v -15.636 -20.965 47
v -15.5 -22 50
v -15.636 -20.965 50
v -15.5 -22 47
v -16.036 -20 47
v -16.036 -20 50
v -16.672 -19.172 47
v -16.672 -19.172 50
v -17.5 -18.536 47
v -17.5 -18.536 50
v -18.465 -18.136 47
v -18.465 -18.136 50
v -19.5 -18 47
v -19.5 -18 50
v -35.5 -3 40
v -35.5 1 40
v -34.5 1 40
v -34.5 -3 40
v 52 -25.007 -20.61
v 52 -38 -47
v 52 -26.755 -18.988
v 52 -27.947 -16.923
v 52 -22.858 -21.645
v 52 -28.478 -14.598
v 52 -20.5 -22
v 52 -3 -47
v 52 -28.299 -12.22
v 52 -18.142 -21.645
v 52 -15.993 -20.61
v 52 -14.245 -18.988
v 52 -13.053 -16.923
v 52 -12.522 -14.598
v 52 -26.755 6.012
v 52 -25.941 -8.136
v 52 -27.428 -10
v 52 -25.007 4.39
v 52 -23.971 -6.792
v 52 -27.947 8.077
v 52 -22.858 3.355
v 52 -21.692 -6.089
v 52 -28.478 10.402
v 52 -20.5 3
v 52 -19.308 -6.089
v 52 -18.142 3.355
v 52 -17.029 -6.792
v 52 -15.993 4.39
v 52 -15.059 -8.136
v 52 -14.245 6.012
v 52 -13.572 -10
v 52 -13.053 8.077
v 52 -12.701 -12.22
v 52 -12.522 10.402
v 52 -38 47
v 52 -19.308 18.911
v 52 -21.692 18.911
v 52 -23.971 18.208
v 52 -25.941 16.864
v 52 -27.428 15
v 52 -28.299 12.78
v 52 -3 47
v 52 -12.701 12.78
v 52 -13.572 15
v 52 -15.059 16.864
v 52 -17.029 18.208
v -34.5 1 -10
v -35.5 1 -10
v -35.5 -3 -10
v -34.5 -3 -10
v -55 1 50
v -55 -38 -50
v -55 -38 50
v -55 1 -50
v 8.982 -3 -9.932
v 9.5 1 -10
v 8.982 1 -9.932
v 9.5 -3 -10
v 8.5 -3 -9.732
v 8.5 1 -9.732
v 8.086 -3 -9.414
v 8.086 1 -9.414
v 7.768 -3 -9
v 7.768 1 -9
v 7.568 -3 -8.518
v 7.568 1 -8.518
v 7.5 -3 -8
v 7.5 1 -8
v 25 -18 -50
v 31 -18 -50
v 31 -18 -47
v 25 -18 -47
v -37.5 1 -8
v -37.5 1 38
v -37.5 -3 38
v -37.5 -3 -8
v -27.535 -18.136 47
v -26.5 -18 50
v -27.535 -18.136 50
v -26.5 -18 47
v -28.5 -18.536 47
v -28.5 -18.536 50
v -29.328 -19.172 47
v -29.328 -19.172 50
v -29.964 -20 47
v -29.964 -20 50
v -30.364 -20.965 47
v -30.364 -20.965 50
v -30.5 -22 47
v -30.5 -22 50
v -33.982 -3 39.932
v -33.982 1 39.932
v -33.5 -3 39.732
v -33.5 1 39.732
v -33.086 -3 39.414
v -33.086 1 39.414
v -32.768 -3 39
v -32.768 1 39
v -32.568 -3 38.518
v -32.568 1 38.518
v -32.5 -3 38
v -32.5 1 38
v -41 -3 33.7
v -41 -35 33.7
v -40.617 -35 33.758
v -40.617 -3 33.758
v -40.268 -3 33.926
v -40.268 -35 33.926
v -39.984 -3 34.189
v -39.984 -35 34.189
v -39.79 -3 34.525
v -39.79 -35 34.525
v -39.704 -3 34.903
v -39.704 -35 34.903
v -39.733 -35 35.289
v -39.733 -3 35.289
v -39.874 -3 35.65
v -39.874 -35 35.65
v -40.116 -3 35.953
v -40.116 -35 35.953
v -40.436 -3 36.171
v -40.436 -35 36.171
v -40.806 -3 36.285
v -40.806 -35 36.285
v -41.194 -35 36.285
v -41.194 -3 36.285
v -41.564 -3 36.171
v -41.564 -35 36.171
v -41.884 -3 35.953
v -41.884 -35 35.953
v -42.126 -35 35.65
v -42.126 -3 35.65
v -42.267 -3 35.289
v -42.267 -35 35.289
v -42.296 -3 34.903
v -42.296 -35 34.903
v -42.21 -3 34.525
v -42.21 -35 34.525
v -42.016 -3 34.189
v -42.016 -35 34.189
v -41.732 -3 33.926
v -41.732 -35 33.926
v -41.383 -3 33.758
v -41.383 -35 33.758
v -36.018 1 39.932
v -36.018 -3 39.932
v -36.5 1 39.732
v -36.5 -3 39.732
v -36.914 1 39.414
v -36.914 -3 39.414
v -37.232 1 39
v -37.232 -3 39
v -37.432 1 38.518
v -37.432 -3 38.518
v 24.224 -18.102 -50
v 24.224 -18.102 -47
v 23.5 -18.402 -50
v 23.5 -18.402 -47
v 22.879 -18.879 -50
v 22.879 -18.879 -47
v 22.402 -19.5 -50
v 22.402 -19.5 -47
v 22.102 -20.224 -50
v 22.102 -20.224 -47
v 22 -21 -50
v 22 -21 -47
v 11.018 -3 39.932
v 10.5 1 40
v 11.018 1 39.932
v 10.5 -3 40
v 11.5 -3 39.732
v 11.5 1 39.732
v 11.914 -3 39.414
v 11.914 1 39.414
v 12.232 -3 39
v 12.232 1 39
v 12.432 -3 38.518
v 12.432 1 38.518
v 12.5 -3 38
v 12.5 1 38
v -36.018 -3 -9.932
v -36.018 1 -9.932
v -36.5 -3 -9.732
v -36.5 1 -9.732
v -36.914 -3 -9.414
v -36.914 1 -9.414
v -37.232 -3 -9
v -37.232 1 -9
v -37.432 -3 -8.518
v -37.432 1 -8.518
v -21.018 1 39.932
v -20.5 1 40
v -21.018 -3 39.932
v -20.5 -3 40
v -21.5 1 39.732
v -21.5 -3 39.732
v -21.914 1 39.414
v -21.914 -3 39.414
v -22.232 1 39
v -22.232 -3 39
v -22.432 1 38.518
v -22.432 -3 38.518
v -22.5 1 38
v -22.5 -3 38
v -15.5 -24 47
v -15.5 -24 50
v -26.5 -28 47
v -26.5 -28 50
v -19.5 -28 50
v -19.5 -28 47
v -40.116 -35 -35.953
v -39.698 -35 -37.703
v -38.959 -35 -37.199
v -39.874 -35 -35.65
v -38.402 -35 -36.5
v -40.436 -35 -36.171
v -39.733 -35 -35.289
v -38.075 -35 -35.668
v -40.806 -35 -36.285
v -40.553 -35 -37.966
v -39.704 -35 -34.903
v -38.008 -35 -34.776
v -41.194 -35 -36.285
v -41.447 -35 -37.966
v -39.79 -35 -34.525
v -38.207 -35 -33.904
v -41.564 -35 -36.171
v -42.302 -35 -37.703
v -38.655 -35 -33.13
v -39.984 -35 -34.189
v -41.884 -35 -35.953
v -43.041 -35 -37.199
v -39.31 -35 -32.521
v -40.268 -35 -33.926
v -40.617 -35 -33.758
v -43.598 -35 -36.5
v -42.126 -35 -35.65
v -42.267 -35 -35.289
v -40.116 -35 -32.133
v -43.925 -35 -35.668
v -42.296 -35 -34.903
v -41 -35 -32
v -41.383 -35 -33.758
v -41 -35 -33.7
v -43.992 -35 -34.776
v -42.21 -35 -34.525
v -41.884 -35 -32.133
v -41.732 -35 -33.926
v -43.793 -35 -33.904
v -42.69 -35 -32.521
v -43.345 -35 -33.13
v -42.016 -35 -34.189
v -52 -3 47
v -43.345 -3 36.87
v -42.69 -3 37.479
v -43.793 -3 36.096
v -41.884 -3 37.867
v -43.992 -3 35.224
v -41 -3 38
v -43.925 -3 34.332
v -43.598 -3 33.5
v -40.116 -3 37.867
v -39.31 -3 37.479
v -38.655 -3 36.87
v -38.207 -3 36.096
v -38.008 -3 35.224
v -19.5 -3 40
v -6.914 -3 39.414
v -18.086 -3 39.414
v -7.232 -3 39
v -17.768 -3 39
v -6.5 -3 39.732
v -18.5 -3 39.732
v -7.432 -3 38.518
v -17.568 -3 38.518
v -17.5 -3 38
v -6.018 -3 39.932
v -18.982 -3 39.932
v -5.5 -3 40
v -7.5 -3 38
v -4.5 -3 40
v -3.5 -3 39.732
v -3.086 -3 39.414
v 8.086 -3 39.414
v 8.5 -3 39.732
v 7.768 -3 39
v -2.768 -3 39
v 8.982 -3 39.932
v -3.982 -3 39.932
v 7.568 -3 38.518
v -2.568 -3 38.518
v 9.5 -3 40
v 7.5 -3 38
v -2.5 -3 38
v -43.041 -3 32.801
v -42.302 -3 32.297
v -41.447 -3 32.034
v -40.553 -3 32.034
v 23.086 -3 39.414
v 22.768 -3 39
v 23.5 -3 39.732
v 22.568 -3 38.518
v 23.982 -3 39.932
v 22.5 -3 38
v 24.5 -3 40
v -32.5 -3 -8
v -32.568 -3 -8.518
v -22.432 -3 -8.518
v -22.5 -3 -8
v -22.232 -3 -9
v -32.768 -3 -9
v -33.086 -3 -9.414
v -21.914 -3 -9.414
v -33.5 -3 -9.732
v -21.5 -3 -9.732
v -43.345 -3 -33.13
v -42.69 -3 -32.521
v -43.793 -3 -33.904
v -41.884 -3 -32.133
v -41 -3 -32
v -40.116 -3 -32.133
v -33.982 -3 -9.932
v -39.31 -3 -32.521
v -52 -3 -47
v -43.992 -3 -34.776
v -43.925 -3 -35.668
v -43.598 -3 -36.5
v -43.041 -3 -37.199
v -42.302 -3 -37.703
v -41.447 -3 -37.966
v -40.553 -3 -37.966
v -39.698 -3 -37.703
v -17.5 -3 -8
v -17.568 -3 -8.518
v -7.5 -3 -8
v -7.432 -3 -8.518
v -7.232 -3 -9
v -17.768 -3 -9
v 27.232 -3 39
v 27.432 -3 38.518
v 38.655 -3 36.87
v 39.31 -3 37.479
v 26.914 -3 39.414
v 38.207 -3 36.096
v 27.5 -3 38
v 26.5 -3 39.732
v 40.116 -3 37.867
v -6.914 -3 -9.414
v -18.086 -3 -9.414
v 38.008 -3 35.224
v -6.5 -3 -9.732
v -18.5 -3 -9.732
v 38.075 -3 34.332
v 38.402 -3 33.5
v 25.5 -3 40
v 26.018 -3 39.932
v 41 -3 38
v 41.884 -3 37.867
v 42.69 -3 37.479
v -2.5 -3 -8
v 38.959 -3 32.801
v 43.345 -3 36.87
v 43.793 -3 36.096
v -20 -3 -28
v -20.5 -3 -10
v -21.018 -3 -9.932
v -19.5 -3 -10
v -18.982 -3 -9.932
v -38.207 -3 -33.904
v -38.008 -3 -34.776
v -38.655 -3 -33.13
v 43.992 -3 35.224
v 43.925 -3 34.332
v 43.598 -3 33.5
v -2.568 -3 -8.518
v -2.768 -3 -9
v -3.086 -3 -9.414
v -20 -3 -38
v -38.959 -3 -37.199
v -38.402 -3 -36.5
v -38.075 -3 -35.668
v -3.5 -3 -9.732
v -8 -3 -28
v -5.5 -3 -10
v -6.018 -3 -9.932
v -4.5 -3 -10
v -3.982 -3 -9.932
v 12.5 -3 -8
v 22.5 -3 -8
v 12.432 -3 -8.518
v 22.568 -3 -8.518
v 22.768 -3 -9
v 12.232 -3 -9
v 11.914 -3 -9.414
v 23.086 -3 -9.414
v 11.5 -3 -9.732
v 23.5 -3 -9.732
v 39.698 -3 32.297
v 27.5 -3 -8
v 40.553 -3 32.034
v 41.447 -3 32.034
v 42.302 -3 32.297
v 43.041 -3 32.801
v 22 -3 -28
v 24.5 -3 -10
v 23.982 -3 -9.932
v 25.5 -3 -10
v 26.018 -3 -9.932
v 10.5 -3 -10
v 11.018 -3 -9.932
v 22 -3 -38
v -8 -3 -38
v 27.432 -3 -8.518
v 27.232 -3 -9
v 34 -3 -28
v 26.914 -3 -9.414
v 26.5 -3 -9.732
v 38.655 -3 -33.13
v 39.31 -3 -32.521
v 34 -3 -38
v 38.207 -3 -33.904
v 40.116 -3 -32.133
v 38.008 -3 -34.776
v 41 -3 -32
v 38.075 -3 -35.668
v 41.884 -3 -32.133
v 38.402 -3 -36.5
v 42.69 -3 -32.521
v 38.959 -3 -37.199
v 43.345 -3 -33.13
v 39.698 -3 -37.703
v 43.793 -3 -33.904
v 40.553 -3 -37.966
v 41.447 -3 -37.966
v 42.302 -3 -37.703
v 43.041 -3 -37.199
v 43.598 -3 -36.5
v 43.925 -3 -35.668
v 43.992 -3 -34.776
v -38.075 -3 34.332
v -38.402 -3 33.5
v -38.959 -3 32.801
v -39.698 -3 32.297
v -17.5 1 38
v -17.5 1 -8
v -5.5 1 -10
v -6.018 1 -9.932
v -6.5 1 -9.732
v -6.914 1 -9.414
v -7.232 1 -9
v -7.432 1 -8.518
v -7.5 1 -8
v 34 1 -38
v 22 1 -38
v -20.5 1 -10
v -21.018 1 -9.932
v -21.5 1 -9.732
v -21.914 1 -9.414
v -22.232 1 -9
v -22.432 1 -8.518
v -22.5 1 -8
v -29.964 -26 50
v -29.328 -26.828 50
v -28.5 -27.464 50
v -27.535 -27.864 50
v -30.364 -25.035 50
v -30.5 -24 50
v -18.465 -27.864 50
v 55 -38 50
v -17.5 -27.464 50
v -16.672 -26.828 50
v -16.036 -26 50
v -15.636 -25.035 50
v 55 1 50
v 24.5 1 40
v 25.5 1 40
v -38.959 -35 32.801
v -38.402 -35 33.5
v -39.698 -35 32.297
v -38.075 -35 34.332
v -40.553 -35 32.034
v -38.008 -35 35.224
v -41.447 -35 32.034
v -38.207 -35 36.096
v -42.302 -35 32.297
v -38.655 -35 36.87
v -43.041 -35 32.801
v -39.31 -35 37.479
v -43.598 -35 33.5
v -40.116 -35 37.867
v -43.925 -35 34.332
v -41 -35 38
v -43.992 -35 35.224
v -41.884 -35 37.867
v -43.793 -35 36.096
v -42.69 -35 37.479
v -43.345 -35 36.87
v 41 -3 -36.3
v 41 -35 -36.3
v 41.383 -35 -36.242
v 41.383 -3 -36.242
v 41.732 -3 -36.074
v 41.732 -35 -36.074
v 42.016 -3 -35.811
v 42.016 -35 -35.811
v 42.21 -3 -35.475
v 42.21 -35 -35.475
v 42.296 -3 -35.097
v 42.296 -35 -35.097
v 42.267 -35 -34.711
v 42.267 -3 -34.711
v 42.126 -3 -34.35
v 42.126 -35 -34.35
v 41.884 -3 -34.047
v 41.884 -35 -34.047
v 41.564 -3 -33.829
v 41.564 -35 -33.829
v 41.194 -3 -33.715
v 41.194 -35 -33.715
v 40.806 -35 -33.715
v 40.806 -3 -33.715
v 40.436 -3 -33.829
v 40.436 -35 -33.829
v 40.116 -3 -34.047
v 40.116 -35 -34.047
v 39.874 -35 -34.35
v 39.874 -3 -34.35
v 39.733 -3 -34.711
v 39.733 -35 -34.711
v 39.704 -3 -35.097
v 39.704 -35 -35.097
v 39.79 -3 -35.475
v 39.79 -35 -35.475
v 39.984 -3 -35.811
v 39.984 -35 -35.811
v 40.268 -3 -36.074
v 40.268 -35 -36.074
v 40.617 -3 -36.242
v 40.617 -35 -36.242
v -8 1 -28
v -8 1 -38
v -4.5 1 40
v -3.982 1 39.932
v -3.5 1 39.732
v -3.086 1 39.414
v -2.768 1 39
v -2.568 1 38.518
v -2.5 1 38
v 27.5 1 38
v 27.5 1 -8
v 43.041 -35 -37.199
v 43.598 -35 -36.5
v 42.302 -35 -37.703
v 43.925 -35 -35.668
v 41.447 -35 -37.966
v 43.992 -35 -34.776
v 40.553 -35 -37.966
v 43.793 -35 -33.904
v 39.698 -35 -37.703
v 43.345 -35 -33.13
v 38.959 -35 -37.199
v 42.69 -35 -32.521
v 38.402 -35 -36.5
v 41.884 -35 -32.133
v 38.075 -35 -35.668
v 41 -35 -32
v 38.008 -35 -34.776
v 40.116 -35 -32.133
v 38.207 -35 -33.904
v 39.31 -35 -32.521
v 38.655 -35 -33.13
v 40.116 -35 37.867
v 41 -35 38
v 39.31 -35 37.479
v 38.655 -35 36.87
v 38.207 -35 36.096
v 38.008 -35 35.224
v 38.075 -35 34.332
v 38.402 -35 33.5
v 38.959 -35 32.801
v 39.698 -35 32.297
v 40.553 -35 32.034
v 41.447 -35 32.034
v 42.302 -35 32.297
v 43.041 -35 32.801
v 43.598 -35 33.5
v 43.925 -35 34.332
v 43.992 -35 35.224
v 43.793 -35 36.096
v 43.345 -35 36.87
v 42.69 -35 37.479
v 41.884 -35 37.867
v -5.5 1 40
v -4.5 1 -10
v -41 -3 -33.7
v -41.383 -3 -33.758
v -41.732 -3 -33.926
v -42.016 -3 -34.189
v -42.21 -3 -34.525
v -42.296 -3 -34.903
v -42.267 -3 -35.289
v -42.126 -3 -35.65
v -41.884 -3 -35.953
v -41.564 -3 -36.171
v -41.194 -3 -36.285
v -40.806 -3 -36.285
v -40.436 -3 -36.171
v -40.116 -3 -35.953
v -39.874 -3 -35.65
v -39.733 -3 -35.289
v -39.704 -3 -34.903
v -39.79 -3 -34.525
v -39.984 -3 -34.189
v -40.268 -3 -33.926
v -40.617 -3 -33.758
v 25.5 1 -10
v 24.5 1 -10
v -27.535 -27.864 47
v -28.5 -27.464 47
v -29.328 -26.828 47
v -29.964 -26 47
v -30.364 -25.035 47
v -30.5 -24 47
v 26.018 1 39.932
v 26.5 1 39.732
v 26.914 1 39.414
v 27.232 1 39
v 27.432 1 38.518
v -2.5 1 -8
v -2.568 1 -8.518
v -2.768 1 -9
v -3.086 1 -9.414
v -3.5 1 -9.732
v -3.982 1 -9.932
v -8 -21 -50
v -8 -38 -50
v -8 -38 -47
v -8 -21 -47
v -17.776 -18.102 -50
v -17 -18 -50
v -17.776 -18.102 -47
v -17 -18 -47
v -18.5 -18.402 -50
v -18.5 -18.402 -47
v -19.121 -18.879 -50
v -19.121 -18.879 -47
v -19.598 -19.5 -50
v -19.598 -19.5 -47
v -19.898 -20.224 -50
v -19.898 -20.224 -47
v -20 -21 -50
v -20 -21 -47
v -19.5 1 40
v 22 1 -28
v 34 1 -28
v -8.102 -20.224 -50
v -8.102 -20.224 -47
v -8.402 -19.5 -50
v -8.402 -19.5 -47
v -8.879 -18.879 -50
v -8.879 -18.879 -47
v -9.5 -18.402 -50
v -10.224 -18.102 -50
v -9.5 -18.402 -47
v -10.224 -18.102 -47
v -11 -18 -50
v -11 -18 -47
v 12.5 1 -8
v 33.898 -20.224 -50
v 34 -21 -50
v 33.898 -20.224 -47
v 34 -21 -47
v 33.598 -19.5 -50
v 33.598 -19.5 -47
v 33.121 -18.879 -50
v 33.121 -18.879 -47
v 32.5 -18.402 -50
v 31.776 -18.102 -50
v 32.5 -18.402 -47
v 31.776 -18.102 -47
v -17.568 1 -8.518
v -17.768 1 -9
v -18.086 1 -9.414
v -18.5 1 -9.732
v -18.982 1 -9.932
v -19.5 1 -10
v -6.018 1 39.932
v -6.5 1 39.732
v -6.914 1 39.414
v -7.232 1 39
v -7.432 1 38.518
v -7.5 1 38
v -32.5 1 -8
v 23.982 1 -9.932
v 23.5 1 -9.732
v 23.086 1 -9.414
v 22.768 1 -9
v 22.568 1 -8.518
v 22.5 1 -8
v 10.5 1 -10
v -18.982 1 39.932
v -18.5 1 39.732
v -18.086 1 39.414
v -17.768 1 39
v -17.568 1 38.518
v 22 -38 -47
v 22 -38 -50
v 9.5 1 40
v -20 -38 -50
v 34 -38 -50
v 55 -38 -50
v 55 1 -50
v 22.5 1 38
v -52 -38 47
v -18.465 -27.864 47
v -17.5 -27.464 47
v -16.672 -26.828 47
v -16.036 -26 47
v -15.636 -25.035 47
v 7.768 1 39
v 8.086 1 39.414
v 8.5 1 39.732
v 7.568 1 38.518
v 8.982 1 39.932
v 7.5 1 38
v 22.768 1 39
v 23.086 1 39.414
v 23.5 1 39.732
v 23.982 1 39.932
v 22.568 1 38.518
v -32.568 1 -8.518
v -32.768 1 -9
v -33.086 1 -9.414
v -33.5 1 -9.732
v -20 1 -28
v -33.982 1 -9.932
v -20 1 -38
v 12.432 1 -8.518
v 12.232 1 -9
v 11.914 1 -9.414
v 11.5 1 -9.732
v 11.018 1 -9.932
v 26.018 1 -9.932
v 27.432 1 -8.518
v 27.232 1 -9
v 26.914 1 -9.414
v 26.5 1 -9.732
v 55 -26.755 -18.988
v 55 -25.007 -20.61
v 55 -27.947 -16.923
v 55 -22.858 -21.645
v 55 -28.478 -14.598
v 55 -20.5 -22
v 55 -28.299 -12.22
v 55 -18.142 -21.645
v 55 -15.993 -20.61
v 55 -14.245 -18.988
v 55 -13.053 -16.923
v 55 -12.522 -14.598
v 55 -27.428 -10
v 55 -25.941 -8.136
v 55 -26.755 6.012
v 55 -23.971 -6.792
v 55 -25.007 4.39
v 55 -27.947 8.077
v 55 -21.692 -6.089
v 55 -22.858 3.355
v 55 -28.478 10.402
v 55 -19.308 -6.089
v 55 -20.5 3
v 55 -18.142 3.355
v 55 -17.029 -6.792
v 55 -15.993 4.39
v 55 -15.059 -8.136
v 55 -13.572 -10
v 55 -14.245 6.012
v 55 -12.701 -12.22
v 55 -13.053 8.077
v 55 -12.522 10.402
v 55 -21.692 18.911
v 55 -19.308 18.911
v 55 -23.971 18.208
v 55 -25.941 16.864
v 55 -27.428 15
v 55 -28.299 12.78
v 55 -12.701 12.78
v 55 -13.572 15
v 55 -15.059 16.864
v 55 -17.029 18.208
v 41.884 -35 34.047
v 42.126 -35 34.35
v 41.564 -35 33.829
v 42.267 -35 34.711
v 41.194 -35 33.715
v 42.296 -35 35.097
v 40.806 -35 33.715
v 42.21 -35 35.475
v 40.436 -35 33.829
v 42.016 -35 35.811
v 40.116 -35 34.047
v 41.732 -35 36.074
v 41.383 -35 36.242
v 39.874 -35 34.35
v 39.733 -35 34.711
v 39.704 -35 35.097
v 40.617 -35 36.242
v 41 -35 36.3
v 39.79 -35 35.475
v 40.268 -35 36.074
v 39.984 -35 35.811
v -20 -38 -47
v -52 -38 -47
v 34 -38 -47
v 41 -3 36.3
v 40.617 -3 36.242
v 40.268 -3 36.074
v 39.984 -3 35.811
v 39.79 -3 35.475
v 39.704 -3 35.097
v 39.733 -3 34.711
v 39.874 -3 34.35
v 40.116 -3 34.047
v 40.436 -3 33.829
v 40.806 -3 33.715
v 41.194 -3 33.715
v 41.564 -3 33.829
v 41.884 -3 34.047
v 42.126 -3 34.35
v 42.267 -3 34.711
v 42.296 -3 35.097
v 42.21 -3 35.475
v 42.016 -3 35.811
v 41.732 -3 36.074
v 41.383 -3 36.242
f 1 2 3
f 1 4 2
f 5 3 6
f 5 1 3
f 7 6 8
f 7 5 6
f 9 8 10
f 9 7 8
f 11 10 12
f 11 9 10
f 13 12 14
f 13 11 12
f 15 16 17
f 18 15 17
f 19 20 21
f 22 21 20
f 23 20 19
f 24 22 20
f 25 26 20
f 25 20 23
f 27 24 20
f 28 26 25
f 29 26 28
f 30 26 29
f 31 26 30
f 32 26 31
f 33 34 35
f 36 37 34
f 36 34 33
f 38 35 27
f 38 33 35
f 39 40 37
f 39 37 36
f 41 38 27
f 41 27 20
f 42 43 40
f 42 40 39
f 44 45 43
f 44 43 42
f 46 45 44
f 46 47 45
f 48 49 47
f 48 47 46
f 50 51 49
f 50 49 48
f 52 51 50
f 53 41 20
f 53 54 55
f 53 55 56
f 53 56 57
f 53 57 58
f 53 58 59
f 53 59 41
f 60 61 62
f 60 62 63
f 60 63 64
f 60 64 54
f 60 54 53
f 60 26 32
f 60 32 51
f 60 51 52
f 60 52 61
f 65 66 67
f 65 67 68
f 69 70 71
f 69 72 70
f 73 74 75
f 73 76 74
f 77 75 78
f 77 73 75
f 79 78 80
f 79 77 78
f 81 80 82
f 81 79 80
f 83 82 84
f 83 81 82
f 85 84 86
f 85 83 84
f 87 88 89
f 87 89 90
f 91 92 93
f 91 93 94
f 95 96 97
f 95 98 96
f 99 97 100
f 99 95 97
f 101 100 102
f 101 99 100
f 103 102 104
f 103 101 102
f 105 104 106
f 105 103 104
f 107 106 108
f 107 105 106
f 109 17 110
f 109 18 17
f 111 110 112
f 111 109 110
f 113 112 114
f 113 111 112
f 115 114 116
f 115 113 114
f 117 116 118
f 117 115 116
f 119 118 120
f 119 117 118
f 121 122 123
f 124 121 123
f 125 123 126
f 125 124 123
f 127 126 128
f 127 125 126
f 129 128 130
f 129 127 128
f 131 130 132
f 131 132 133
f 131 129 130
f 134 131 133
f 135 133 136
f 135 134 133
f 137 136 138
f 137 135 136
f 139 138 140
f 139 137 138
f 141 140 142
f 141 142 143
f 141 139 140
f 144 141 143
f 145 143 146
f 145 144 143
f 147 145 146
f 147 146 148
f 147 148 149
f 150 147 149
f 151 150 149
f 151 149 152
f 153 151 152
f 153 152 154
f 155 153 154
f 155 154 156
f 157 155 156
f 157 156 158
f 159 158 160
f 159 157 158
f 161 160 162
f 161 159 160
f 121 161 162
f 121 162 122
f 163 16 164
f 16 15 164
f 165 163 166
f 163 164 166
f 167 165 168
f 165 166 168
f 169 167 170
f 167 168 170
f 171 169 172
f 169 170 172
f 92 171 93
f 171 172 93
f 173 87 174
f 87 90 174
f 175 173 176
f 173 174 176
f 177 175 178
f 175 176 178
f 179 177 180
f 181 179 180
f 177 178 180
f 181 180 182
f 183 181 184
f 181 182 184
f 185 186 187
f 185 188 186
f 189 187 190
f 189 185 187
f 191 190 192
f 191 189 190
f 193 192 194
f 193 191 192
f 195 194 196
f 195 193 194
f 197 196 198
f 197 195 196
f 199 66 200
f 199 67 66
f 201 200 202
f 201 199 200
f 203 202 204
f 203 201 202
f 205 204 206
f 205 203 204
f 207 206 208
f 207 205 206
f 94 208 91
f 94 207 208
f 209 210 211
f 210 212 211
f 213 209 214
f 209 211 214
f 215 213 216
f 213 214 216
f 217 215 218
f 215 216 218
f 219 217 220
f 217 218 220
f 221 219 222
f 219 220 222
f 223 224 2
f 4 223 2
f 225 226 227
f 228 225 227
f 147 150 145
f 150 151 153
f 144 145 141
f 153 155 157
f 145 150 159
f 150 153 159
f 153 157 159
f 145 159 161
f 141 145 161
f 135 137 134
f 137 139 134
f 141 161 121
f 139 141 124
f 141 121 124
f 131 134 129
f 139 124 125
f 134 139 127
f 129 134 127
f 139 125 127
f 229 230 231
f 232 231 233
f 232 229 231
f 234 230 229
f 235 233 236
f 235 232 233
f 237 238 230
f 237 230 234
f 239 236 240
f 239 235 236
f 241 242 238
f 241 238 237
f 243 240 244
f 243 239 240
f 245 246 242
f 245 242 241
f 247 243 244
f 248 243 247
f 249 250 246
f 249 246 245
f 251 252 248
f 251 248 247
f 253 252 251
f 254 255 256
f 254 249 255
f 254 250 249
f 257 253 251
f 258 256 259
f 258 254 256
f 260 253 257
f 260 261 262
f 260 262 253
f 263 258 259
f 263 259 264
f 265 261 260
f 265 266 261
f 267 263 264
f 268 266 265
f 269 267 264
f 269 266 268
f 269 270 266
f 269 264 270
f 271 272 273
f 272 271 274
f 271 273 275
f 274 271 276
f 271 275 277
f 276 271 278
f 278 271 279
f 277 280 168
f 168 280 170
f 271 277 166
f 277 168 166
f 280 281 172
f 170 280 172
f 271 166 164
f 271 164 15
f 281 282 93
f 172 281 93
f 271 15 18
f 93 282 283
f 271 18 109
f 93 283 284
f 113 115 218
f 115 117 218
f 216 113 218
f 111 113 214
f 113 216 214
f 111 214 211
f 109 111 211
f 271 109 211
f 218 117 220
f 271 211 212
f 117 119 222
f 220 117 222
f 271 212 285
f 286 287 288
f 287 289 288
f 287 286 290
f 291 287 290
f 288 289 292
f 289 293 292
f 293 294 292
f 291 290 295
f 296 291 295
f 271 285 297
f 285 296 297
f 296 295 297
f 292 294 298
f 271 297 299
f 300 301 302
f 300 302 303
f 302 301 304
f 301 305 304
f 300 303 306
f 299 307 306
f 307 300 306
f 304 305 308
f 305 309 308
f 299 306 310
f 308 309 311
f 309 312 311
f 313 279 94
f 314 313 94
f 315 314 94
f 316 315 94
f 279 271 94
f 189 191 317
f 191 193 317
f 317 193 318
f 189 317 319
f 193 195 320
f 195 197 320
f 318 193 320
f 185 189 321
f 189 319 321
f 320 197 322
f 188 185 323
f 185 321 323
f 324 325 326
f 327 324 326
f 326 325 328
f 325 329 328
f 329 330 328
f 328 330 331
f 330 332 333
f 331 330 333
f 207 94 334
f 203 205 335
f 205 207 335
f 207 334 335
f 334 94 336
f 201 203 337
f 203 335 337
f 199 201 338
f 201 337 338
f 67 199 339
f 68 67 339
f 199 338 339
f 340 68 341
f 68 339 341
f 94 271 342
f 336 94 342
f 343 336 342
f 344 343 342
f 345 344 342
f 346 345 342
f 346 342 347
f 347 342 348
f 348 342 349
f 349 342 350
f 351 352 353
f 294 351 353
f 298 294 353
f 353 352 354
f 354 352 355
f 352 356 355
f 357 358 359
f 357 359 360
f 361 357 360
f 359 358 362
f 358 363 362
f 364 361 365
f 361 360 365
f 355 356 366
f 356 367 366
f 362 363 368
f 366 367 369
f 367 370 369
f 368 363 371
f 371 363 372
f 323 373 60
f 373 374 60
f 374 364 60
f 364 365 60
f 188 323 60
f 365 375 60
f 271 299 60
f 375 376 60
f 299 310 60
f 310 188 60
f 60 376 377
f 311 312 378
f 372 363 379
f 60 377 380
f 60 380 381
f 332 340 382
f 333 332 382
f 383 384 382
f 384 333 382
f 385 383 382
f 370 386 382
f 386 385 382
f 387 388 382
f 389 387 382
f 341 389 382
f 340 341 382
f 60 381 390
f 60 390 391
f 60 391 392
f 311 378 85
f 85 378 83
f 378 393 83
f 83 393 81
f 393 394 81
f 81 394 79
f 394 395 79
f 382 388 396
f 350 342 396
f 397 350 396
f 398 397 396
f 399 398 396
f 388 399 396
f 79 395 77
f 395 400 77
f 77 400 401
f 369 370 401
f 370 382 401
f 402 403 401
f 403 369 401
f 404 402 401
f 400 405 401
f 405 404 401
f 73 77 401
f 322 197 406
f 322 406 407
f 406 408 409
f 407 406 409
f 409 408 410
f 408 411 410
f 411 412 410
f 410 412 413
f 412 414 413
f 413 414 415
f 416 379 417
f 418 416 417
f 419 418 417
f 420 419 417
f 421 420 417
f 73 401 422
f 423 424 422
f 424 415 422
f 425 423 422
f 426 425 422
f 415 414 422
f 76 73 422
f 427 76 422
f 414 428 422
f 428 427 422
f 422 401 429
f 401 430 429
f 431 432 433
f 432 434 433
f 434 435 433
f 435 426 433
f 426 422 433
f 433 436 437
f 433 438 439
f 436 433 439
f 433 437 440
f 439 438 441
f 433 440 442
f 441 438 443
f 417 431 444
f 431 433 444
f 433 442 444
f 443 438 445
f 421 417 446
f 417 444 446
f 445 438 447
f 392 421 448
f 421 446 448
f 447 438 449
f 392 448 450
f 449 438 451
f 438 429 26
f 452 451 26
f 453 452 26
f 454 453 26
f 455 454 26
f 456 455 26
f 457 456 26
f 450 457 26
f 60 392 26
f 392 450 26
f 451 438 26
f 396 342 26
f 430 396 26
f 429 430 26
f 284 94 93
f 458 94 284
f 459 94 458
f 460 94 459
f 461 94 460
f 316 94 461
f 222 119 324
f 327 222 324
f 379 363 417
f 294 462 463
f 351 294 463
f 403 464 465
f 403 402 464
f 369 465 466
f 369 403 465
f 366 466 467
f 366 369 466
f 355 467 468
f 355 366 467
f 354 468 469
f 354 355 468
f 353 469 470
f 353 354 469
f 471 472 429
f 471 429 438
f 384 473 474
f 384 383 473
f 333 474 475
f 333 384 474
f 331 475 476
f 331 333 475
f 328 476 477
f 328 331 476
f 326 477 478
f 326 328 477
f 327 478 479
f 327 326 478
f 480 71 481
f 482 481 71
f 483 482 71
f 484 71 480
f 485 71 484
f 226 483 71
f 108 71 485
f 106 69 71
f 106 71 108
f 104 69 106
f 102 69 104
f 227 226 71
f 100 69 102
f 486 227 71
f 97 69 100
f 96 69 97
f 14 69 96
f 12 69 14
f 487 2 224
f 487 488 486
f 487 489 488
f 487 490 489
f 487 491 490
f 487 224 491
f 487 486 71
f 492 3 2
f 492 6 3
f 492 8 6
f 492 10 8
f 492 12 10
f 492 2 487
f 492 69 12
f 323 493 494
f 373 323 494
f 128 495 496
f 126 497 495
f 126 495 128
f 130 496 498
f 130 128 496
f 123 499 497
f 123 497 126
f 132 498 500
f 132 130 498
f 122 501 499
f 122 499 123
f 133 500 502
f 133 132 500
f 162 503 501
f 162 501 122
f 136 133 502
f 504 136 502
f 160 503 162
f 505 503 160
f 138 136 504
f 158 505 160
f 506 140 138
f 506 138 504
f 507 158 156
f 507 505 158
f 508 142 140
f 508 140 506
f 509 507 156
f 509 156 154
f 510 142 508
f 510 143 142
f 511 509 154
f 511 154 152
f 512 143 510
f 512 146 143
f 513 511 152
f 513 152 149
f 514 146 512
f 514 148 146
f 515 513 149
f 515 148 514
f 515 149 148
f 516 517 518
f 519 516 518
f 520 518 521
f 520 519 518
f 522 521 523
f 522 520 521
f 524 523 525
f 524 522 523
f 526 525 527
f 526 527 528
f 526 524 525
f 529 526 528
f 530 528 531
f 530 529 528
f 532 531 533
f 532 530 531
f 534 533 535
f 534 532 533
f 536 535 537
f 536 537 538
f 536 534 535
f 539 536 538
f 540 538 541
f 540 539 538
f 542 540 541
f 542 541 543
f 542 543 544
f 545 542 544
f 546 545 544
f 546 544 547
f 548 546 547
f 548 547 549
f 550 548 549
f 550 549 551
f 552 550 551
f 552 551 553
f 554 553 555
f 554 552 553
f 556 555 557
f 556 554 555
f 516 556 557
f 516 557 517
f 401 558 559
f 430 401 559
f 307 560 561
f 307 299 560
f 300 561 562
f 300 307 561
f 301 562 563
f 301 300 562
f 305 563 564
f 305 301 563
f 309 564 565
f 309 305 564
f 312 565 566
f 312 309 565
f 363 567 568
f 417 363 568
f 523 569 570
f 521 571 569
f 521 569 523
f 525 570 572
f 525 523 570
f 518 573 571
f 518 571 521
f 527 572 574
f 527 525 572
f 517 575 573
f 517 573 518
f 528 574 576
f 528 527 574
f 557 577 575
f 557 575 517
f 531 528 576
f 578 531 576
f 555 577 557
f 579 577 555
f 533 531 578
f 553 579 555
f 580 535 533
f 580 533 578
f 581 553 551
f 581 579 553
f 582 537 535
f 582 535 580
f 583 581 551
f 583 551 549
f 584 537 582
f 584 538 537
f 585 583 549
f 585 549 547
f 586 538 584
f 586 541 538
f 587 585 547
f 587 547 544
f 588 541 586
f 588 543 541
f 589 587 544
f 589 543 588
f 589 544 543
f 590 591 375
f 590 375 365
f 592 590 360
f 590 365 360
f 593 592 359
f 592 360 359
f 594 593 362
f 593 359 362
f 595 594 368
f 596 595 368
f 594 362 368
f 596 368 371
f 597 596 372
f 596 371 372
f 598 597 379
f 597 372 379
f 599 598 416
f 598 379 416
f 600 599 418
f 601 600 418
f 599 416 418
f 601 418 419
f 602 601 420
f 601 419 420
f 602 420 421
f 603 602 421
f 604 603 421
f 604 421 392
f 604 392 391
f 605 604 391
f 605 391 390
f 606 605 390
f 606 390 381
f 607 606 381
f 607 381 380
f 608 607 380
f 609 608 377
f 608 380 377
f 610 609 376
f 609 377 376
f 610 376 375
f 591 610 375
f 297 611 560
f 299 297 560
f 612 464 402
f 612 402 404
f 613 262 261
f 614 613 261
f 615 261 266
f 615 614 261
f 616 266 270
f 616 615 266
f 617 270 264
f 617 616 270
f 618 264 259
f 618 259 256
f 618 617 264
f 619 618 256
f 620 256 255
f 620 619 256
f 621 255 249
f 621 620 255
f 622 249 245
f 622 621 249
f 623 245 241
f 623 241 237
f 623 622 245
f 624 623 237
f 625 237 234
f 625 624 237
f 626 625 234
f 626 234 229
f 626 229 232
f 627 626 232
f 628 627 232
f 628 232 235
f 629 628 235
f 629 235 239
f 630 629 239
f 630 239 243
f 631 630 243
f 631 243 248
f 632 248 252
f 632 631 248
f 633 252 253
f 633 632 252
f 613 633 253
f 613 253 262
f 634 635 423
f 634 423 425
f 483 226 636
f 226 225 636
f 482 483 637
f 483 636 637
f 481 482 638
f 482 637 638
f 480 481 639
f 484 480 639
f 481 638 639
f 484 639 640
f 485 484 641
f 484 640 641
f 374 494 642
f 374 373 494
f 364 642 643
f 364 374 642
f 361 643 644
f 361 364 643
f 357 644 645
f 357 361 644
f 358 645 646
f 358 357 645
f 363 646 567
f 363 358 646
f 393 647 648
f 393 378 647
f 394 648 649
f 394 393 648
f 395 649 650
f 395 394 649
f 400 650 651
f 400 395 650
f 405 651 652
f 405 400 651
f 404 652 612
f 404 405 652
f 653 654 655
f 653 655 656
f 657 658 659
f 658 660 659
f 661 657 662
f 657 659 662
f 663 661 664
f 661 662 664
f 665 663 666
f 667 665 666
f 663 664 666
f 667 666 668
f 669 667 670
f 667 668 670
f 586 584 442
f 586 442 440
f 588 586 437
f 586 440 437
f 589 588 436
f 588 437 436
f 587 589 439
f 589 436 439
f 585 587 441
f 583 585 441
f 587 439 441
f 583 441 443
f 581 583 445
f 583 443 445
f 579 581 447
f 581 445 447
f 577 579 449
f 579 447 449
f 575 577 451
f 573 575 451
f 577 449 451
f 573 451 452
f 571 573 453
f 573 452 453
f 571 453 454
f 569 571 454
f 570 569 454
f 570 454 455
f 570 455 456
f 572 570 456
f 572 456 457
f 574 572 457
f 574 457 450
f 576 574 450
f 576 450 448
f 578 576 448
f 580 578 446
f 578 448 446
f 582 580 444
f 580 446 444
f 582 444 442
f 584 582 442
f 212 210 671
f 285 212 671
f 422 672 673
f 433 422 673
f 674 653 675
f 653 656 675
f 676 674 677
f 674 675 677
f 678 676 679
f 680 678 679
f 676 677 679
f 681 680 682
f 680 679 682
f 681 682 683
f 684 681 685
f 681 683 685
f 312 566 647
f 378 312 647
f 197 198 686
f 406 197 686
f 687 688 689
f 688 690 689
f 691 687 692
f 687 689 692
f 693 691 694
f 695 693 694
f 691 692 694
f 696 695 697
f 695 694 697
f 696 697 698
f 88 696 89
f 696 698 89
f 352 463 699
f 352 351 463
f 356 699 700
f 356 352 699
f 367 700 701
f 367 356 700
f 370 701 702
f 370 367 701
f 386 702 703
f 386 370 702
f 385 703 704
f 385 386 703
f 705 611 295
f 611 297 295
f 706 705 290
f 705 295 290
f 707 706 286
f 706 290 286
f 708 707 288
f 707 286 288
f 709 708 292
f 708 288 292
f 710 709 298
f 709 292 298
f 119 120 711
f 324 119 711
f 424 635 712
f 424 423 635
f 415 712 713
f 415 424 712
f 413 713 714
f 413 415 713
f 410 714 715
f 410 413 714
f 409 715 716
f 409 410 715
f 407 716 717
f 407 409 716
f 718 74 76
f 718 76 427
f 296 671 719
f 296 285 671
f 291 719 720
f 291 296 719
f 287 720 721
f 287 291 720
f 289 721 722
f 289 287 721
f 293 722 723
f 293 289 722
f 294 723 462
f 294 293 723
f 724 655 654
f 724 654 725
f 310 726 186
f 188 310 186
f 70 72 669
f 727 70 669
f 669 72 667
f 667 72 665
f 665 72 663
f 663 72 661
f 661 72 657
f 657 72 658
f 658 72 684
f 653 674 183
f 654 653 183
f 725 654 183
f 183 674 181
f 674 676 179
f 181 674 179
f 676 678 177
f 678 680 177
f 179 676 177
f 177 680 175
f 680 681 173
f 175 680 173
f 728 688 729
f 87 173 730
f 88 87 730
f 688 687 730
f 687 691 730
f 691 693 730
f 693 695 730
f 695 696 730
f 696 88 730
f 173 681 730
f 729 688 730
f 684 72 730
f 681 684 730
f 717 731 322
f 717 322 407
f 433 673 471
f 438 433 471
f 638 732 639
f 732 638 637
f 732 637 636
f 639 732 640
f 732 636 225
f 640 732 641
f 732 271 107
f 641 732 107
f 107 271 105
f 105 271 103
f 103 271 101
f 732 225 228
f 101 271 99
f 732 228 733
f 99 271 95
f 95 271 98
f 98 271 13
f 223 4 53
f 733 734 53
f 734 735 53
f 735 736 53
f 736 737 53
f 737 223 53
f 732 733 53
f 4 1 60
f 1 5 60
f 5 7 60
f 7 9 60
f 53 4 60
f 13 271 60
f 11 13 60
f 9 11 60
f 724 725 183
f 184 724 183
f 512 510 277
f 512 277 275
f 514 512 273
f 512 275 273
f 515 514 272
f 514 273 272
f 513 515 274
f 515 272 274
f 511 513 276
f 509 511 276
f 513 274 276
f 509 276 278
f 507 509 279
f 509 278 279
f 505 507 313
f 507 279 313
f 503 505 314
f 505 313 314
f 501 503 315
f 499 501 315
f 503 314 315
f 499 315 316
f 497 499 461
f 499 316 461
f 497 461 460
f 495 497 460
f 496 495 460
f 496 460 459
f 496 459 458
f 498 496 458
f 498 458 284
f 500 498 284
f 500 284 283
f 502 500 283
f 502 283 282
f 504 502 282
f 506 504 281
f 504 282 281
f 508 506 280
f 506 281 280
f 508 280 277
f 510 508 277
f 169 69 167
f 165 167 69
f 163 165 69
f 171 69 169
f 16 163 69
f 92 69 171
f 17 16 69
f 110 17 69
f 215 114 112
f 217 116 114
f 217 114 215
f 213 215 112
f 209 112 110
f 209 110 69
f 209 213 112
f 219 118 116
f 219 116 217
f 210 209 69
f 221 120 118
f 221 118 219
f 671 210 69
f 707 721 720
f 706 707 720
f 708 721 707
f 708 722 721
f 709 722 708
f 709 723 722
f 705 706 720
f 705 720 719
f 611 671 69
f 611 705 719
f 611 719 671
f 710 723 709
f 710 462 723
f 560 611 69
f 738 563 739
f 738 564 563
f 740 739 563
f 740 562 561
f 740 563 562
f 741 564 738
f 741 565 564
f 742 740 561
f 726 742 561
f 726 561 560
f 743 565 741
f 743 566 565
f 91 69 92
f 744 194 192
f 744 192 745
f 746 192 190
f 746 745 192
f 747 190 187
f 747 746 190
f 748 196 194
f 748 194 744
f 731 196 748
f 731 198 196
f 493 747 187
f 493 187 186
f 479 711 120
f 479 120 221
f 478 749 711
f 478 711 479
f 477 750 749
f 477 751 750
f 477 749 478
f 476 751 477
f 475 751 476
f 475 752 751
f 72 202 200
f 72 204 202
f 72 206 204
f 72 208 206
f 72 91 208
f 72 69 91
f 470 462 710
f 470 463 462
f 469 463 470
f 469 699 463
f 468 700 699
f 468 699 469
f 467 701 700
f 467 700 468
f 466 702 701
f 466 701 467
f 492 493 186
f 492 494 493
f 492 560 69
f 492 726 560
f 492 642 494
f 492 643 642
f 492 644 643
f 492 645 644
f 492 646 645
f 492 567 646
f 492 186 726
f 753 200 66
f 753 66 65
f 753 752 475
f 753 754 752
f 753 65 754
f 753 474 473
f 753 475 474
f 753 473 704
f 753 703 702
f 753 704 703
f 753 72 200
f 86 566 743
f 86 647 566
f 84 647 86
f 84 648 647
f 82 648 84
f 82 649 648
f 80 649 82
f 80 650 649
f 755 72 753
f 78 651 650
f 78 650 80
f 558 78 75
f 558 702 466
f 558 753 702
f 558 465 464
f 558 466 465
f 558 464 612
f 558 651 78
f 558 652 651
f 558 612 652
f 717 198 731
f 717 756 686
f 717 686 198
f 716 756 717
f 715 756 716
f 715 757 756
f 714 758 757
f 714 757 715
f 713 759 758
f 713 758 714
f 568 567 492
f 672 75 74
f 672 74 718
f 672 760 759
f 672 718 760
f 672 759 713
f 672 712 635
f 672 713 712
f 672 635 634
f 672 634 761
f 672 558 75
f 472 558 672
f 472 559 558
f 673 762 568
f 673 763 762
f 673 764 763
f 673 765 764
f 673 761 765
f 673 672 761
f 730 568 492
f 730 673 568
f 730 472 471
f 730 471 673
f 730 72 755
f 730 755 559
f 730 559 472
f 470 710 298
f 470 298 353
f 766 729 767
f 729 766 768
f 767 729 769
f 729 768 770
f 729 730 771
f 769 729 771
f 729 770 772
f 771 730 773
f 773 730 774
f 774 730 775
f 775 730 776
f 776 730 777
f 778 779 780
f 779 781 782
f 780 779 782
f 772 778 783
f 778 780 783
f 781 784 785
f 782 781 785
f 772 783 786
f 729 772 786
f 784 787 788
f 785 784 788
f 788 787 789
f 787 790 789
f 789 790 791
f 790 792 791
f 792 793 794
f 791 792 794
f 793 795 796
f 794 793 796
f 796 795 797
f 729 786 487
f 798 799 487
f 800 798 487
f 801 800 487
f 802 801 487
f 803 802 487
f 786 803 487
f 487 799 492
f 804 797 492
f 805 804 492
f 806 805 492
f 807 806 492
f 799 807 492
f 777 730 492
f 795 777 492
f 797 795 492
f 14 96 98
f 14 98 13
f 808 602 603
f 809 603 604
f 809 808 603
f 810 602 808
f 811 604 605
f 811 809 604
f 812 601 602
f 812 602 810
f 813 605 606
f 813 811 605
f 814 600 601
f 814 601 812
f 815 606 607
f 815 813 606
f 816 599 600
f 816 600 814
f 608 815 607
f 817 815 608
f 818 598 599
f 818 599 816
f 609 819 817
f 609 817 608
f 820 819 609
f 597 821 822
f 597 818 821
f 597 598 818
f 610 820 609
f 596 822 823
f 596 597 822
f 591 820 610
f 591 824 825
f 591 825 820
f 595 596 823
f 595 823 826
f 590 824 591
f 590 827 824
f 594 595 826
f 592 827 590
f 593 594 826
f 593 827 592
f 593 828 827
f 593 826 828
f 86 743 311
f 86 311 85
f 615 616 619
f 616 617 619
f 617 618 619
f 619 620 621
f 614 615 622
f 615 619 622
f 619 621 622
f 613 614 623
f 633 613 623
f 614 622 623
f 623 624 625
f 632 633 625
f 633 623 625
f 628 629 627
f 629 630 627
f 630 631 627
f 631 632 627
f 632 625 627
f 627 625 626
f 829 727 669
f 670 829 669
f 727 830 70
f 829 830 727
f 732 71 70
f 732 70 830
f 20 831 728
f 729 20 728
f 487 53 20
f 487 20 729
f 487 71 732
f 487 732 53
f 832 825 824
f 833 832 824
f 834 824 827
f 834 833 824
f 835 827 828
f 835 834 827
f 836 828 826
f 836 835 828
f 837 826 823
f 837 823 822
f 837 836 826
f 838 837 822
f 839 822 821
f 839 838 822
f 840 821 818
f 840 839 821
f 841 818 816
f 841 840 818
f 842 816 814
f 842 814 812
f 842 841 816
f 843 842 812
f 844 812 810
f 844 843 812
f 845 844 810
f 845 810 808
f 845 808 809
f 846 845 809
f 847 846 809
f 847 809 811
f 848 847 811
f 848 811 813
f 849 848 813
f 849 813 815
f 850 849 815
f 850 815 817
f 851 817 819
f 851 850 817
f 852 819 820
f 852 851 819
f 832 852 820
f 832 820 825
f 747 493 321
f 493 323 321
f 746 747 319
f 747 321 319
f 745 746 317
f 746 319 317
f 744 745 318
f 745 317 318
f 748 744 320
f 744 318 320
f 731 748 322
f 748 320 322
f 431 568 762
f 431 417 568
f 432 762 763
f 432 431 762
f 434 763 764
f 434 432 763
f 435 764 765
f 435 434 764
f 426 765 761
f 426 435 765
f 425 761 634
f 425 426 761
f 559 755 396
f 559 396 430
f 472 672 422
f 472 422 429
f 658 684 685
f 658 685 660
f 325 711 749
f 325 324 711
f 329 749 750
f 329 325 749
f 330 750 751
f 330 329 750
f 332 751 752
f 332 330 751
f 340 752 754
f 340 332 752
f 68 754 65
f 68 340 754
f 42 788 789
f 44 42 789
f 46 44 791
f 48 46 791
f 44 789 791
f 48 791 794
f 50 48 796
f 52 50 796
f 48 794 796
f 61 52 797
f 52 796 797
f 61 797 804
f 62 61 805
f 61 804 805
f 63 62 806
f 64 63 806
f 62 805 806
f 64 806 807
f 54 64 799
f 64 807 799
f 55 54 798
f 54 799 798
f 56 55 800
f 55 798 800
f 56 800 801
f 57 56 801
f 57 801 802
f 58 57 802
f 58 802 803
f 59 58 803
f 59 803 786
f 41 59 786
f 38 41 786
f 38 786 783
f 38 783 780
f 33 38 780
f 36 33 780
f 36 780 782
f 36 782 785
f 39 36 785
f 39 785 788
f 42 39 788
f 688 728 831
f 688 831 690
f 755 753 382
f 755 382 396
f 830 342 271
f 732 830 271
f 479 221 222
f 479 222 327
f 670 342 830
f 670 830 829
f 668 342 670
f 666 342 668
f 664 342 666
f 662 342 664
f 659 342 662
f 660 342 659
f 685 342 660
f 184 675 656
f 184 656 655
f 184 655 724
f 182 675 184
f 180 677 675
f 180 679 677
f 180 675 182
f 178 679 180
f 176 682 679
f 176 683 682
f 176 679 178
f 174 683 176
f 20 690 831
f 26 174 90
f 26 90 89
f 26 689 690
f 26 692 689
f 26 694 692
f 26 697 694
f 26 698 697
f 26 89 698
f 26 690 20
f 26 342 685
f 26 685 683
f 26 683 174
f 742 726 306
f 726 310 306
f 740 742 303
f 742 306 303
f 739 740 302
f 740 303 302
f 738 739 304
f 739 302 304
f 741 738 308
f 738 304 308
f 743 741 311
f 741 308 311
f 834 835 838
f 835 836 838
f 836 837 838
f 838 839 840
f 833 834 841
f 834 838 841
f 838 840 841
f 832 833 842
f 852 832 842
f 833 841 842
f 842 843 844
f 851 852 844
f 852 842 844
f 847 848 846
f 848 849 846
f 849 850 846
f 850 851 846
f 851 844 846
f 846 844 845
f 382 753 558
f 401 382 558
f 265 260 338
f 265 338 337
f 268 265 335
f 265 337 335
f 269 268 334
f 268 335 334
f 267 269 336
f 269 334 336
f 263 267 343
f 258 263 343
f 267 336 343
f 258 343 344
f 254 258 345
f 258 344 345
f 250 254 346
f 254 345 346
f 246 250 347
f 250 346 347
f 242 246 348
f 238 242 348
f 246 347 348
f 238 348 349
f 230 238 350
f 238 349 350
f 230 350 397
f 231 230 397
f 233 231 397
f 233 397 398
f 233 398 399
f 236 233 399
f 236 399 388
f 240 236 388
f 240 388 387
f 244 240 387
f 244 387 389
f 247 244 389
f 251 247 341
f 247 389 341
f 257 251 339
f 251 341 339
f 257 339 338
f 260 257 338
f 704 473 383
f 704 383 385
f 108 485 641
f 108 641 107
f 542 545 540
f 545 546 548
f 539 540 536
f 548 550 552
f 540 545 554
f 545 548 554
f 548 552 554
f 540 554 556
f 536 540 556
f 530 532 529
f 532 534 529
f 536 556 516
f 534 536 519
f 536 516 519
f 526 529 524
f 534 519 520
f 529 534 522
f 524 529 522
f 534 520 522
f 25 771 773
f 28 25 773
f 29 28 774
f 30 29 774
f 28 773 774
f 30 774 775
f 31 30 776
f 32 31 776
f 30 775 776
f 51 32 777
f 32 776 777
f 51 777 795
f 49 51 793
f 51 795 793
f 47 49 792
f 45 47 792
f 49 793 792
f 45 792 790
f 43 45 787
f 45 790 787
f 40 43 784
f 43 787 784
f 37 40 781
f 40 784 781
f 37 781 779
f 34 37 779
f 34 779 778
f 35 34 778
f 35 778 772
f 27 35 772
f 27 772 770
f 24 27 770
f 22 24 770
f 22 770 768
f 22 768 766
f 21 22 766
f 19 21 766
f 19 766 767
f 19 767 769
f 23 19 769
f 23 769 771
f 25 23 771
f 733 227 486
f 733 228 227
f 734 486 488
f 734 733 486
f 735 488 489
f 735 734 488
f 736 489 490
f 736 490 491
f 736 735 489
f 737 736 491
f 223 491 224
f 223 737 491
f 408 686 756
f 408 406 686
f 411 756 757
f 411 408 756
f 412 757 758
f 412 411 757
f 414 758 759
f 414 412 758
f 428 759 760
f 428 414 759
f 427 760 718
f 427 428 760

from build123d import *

# Parameters (mm, degrees)
BOSS_EXTRUDE1_DEPTH      = 1
BOSS_EXTRUDE1_DEPTH_BACK = 3
SKETCH1_W                = 110
SKETCH1_H                = 100
SKETCH2_W                = 110
SKETCH2_H                = 100
SKETCH2_W_2              = 104
SKETCH2_H_2              = 94
BOSS_EXTRUDE2_DEPTH      = 35
SKETCH3_R                = 3
SKETCH3_R_2              = 1.3
BOSS_EXTRUDE3_DEPTH      = 32
SKETCH5_W                = 12
SKETCH5_H                = 20
CUT_EXTRUDE5_DEPTH       = 32
SKETCH6_W                = 15
SKETCH6_H                = 10
CUT_EXTRUDE6_DEPTH       = 32
SKETCH7_R                = 8
CUT_EXTRUDE7_DEPTH       = 22
SKETCH8_W                = 12
SKETCH8_H                = 10
CUT_EXTRUDE8_DEPTH       = 22
SKETCH9_W                = 5
SKETCH9_H                = 50
CUT_EXTRUDE9_DEPTH       = 10
FILLET1_R                = 2
FILLET2_R                = 3
FILLET3_R                = 4


with BuildPart() as part:
    # Sketch1 → Boss-Extrude1 (new, two sides: drawn at the far end of the back side and taken through both)
    with BuildSketch(Plane(origin=(0, 0, 0), x_dir=(1, 0, 0), z_dir=(0, 1, 0)).offset(-BOSS_EXTRUDE1_DEPTH_BACK)):
        Rectangle(SKETCH1_W, SKETCH1_H)
    extrude(amount=BOSS_EXTRUDE1_DEPTH + BOSS_EXTRUDE1_DEPTH_BACK)

    # Sketch2 → Boss-Extrude2 (add)
    with BuildSketch(Plane.XZ.offset(3)):
        Rectangle(SKETCH2_W, SKETCH2_H)
        Rectangle(SKETCH2_W_2, SKETCH2_H_2, mode=Mode.SUBTRACT)
    extrude(amount=BOSS_EXTRUDE2_DEPTH)

    # Sketch3 → Boss-Extrude3 (add)
    # profile 1 of 4: a face of its own
    with BuildSketch(Plane.XZ.offset(3)):
        with Locations(Location((-41, 35, 0), (0, 0, 90))):
            Circle(SKETCH3_R)
        with Locations(Location((-41, 35, 0), (0, 0, 270))):
            Circle(SKETCH3_R_2, mode=Mode.SUBTRACT)
    # profile 2 of 4: a face of its own
    with BuildSketch(Plane.XZ.offset(3)):
        with Locations(Location((-41, -35, 0), (0, 0, 90))):
            Circle(SKETCH3_R)
        with Locations(Location((-41, -35, 0), (0, 0, 90))):
            Circle(SKETCH3_R_2, mode=Mode.SUBTRACT)
    # profile 3 of 4: a face of its own
    with BuildSketch(Plane.XZ.offset(3)):
        with Locations(Location((41, -35, 0), (0, 0, 90))):
            Circle(SKETCH3_R)
        with Locations(Location((41, -35, 0), (0, 0, 270))):
            Circle(SKETCH3_R_2, mode=Mode.SUBTRACT)
    # profile 4 of 4: a face of its own
    with BuildSketch(Plane.XZ.offset(3)):
        with Locations(Location((41, 35, 0), (0, 0, 90))):
            Circle(SKETCH3_R)
        with Locations(Location((41, 35, 0), (0, 0, 90))):
            Circle(SKETCH3_R_2, mode=Mode.SUBTRACT)
    extrude(amount=BOSS_EXTRUDE3_DEPTH)

    # Sketch5 → Cut-Extrude5 (cut)
    with BuildSketch(Plane(origin=(0, 0, -50), x_dir=(-1, 0, 0), z_dir=(0, 0, -1))):
        with Locations((-28, -28)):
            Rectangle(SKETCH5_W, SKETCH5_H)
        with Locations((14, -28)):
            Rectangle(SKETCH5_W, SKETCH5_H)
    extrude(amount=-CUT_EXTRUDE5_DEPTH, mode=Mode.SUBTRACT)

    # Sketch6 → Cut-Extrude6 (cut)
    with BuildSketch(Plane.XY.offset(50)):
        with Locations((-23, -23)):
            Rectangle(SKETCH6_W, SKETCH6_H)
    extrude(amount=-CUT_EXTRUDE6_DEPTH, mode=Mode.SUBTRACT)

    # Sketch7 → Cut-Extrude7 (cut)
    with BuildSketch(Plane(origin=(55, 0, 0), x_dir=(0, 0, -1), z_dir=(1, 0, 0))):
        with Locations((-11, -20.5)):
            Circle(SKETCH7_R)
        with Locations((14, -20.5)):
            Circle(SKETCH7_R)
    extrude(amount=-CUT_EXTRUDE7_DEPTH, mode=Mode.SUBTRACT)

    # Sketch8 → Cut-Extrude8 (cut)
    with BuildSketch(Plane(origin=(0, 1, 0), x_dir=(1, 0, 0), z_dir=(0, 1, 0))):
        with Locations((28, 33)):
            Rectangle(SKETCH8_W, SKETCH8_H)
        with Locations((-14, 33)):
            Rectangle(SKETCH8_W, SKETCH8_H)
    extrude(amount=-CUT_EXTRUDE8_DEPTH, mode=Mode.SUBTRACT)

    # Sketch9 → Cut-Extrude9 (cut)
    with BuildSketch(Plane(origin=(0, 1, 0), x_dir=(1, 0, 0), z_dir=(0, 1, 0))):
        with Locations((-35, -15)):
            Rectangle(SKETCH9_W, SKETCH9_H)
        with Locations((-20, -15)):
            Rectangle(SKETCH9_W, SKETCH9_H)
        with Locations((-5, -15)):
            Rectangle(SKETCH9_W, SKETCH9_H)
        with Locations((10, -15)):
            Rectangle(SKETCH9_W, SKETCH9_H)
        with Locations((25, -15)):
            Rectangle(SKETCH9_W, SKETCH9_H)
    extrude(amount=-CUT_EXTRUDE9_DEPTH, mode=Mode.SUBTRACT)

    # Fillet1
    fillet1_edges = [part.edges().sort_by_distance(p)[0] for p in [
        (-32.5, -1, -10),
        (-32.5, -1, 40),
        (-37.5, -1, 40),
        (-37.5, -1, -10),
        (-17.5, -1, -10),
        (-17.5, -1, 40),
        (-22.5, -1, 40),
        (-22.5, -1, -10),
        (-2.5, -1, -10),
        (-2.5, -1, 40),
        (-7.5, -1, 40),
        (-7.5, -1, -10),
        (7.5, -1, 40),
        (7.5, -1, -10),
        (12.5, -1, -10),
        (12.5, -1, 40),
        (22.5, -1, 40),
        (22.5, -1, -10),
        (27.5, -1, -10),
        (27.5, -1, 40),
    ]]
    fillet(fillet1_edges, radius=FILLET1_R)

    # Fillet2
    fillet2_edges = [part.edges().sort_by_distance(p)[0] for p in [
        (-20, -18, -48.5),
        (-8, -18, -48.5),
        (34, -18, -48.5),
        (22, -18, -48.5),
    ]]
    fillet(fillet2_edges, radius=FILLET2_R)

    # Fillet3
    fillet3_edges = [part.edges().sort_by_distance(p)[0] for p in [
        (-15.5, -18, 48.5),
        (-15.5, -28, 48.5),
        (-30.5, -28, 48.5),
        (-30.5, -18, 48.5),
    ]]
    fillet(fillet3_edges, radius=FILLET3_R)


solid = part.part
